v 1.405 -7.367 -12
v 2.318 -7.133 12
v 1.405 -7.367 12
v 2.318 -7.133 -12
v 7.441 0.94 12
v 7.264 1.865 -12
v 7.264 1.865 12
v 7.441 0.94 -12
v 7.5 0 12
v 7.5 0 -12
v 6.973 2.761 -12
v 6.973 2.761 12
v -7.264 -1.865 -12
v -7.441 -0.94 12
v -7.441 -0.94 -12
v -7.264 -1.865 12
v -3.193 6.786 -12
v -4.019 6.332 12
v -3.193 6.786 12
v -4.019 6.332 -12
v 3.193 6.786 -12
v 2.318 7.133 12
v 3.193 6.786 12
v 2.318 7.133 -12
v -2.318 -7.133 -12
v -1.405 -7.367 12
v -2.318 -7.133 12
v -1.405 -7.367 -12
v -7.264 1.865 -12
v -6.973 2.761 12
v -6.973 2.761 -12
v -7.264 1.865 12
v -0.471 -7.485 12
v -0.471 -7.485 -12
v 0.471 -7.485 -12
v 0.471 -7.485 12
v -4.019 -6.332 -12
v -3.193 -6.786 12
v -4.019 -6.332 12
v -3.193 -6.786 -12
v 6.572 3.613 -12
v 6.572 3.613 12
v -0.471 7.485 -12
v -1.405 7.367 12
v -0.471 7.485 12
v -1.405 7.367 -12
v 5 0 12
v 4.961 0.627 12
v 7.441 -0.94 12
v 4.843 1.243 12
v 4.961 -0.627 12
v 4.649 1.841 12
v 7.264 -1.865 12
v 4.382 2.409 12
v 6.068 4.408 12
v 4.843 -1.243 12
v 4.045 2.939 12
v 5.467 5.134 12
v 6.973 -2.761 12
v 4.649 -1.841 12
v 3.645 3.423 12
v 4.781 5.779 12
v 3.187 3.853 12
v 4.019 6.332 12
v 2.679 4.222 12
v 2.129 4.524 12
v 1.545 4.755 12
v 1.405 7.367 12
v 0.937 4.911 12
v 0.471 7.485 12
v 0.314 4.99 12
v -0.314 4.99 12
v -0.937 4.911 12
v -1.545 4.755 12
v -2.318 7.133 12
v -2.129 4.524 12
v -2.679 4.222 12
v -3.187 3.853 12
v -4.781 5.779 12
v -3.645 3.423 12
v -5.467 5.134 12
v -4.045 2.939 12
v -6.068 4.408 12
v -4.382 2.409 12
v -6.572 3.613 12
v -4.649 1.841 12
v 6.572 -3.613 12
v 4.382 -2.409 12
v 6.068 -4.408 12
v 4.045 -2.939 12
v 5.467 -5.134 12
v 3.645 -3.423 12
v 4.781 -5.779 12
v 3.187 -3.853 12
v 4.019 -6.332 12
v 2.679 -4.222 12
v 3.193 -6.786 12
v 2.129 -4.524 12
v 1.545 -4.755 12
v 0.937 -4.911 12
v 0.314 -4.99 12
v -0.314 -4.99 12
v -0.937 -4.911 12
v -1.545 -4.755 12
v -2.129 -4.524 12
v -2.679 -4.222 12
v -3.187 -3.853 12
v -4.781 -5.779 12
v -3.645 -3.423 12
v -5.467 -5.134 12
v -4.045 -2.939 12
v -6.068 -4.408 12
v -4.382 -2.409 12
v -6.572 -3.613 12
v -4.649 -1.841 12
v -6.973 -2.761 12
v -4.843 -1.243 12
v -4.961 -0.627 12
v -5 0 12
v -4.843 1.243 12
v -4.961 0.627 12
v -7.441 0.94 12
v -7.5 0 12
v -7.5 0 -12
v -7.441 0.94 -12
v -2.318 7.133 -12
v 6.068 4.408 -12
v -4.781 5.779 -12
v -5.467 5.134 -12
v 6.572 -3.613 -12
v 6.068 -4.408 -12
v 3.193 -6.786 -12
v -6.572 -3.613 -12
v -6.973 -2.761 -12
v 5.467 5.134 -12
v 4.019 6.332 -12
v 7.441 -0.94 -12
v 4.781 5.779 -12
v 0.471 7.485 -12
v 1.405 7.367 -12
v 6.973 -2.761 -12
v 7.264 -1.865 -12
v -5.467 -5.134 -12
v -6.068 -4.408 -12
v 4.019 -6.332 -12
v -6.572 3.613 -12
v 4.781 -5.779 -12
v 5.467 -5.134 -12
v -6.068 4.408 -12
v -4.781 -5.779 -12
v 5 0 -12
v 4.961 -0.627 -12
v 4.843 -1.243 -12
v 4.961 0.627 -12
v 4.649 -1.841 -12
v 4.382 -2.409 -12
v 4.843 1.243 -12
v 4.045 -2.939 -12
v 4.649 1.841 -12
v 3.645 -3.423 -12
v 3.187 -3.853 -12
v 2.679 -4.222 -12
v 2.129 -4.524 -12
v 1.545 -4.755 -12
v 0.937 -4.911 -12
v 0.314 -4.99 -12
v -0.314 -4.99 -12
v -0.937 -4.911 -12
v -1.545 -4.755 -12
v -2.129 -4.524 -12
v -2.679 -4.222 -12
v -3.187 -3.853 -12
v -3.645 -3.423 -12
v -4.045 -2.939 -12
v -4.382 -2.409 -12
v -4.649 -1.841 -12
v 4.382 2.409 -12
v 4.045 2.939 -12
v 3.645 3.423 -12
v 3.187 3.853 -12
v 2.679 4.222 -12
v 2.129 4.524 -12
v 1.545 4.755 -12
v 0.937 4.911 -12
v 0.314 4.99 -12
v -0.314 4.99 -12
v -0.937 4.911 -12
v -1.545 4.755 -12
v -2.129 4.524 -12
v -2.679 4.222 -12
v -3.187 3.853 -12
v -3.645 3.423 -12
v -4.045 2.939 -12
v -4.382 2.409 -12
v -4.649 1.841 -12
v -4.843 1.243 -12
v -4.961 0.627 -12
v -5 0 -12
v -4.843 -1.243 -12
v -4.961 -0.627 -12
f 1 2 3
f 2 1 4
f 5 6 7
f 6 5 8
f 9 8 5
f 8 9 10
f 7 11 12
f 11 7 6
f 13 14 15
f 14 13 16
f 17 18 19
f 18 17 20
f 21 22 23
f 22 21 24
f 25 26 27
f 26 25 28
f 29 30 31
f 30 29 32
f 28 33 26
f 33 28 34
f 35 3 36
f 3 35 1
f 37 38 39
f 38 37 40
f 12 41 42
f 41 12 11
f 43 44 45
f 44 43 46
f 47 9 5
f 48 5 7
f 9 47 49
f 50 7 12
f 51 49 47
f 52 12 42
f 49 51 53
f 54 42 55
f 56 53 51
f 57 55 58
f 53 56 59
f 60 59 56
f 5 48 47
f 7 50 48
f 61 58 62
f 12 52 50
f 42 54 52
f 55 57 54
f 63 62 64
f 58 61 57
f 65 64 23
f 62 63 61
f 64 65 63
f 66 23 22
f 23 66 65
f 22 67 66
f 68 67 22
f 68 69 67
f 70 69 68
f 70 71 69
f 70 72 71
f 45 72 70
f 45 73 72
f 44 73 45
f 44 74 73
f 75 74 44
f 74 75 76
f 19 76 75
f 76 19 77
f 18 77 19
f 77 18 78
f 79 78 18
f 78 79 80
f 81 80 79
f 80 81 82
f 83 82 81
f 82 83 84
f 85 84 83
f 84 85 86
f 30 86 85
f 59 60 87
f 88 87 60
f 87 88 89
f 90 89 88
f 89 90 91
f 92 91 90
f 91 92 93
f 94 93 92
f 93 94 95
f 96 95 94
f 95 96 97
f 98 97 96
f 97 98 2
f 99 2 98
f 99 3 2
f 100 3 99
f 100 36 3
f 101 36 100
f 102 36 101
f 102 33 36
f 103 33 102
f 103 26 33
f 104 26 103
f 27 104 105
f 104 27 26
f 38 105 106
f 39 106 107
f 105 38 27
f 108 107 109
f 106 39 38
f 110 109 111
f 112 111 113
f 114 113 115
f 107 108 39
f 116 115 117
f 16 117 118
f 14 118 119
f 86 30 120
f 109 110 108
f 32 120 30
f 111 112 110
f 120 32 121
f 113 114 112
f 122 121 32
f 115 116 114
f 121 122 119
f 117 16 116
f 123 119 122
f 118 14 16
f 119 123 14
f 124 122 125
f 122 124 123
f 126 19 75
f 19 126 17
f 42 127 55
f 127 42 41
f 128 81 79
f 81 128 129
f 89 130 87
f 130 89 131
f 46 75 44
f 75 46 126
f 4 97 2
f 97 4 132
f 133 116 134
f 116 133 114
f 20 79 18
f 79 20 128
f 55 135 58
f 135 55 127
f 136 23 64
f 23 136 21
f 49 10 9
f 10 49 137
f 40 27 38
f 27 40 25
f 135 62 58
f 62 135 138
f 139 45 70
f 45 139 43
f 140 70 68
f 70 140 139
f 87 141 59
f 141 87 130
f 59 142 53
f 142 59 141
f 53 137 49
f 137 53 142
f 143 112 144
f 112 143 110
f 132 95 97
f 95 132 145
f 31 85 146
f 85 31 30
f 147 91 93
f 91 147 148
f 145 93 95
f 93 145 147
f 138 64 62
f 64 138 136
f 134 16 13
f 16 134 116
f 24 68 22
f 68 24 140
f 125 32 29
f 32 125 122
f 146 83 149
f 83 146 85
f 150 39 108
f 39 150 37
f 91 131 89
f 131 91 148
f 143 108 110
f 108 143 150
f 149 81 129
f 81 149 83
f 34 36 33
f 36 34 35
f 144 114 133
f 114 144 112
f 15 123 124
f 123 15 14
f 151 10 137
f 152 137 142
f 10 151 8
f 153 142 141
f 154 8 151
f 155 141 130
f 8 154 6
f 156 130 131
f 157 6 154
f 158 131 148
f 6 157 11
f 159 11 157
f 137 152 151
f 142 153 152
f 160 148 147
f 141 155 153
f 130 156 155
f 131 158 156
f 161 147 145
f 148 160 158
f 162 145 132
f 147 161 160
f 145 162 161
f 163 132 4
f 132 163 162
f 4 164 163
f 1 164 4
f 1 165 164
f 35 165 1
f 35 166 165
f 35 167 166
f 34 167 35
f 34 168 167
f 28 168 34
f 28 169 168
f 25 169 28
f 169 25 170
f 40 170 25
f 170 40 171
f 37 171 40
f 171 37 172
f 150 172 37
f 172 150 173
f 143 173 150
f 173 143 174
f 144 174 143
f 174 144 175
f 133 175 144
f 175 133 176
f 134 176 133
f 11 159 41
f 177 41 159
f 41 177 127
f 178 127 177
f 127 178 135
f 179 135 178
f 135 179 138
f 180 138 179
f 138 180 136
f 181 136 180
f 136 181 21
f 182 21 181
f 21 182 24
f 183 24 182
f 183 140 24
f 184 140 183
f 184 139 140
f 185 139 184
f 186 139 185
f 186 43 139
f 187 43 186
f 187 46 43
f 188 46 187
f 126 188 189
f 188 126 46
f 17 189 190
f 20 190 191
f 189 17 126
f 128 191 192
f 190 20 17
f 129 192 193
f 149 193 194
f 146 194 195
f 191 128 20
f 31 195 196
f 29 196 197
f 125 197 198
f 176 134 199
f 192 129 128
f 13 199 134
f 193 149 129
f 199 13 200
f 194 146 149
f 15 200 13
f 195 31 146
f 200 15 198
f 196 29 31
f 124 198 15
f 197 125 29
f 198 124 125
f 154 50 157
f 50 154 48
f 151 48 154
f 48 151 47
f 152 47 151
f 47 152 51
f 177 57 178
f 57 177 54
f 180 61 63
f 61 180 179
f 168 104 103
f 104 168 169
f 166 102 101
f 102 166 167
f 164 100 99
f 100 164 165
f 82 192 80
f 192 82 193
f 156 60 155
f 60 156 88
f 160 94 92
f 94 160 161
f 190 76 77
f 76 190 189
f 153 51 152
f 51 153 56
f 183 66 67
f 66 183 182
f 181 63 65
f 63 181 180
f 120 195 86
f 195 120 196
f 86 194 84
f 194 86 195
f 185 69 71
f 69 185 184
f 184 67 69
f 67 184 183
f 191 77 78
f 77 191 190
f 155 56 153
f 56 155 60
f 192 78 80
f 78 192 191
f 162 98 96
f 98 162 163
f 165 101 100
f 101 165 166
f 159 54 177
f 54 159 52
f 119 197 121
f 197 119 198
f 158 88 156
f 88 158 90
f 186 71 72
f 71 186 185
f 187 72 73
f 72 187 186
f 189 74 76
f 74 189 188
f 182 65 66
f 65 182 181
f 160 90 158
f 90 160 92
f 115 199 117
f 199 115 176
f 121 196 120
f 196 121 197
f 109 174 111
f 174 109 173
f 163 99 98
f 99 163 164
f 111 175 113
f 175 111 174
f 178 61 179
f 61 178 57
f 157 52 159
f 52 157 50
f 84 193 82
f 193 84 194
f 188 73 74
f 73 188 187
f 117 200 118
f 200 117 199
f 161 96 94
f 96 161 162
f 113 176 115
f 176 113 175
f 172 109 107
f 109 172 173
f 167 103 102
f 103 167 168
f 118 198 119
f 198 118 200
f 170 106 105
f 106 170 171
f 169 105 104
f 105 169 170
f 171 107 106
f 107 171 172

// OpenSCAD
$fn = 50;


difference() {
	union() {
		translate(v = [0, 0, -12.0000000000]) {
			cylinder(h = 24, r = 7.5000000000);
		}
	}
	union() {
		translate(v = [0, 0, -100.0000000000]) {
			cylinder(h = 200, r = 5.0000000000);
		}
	}
}
